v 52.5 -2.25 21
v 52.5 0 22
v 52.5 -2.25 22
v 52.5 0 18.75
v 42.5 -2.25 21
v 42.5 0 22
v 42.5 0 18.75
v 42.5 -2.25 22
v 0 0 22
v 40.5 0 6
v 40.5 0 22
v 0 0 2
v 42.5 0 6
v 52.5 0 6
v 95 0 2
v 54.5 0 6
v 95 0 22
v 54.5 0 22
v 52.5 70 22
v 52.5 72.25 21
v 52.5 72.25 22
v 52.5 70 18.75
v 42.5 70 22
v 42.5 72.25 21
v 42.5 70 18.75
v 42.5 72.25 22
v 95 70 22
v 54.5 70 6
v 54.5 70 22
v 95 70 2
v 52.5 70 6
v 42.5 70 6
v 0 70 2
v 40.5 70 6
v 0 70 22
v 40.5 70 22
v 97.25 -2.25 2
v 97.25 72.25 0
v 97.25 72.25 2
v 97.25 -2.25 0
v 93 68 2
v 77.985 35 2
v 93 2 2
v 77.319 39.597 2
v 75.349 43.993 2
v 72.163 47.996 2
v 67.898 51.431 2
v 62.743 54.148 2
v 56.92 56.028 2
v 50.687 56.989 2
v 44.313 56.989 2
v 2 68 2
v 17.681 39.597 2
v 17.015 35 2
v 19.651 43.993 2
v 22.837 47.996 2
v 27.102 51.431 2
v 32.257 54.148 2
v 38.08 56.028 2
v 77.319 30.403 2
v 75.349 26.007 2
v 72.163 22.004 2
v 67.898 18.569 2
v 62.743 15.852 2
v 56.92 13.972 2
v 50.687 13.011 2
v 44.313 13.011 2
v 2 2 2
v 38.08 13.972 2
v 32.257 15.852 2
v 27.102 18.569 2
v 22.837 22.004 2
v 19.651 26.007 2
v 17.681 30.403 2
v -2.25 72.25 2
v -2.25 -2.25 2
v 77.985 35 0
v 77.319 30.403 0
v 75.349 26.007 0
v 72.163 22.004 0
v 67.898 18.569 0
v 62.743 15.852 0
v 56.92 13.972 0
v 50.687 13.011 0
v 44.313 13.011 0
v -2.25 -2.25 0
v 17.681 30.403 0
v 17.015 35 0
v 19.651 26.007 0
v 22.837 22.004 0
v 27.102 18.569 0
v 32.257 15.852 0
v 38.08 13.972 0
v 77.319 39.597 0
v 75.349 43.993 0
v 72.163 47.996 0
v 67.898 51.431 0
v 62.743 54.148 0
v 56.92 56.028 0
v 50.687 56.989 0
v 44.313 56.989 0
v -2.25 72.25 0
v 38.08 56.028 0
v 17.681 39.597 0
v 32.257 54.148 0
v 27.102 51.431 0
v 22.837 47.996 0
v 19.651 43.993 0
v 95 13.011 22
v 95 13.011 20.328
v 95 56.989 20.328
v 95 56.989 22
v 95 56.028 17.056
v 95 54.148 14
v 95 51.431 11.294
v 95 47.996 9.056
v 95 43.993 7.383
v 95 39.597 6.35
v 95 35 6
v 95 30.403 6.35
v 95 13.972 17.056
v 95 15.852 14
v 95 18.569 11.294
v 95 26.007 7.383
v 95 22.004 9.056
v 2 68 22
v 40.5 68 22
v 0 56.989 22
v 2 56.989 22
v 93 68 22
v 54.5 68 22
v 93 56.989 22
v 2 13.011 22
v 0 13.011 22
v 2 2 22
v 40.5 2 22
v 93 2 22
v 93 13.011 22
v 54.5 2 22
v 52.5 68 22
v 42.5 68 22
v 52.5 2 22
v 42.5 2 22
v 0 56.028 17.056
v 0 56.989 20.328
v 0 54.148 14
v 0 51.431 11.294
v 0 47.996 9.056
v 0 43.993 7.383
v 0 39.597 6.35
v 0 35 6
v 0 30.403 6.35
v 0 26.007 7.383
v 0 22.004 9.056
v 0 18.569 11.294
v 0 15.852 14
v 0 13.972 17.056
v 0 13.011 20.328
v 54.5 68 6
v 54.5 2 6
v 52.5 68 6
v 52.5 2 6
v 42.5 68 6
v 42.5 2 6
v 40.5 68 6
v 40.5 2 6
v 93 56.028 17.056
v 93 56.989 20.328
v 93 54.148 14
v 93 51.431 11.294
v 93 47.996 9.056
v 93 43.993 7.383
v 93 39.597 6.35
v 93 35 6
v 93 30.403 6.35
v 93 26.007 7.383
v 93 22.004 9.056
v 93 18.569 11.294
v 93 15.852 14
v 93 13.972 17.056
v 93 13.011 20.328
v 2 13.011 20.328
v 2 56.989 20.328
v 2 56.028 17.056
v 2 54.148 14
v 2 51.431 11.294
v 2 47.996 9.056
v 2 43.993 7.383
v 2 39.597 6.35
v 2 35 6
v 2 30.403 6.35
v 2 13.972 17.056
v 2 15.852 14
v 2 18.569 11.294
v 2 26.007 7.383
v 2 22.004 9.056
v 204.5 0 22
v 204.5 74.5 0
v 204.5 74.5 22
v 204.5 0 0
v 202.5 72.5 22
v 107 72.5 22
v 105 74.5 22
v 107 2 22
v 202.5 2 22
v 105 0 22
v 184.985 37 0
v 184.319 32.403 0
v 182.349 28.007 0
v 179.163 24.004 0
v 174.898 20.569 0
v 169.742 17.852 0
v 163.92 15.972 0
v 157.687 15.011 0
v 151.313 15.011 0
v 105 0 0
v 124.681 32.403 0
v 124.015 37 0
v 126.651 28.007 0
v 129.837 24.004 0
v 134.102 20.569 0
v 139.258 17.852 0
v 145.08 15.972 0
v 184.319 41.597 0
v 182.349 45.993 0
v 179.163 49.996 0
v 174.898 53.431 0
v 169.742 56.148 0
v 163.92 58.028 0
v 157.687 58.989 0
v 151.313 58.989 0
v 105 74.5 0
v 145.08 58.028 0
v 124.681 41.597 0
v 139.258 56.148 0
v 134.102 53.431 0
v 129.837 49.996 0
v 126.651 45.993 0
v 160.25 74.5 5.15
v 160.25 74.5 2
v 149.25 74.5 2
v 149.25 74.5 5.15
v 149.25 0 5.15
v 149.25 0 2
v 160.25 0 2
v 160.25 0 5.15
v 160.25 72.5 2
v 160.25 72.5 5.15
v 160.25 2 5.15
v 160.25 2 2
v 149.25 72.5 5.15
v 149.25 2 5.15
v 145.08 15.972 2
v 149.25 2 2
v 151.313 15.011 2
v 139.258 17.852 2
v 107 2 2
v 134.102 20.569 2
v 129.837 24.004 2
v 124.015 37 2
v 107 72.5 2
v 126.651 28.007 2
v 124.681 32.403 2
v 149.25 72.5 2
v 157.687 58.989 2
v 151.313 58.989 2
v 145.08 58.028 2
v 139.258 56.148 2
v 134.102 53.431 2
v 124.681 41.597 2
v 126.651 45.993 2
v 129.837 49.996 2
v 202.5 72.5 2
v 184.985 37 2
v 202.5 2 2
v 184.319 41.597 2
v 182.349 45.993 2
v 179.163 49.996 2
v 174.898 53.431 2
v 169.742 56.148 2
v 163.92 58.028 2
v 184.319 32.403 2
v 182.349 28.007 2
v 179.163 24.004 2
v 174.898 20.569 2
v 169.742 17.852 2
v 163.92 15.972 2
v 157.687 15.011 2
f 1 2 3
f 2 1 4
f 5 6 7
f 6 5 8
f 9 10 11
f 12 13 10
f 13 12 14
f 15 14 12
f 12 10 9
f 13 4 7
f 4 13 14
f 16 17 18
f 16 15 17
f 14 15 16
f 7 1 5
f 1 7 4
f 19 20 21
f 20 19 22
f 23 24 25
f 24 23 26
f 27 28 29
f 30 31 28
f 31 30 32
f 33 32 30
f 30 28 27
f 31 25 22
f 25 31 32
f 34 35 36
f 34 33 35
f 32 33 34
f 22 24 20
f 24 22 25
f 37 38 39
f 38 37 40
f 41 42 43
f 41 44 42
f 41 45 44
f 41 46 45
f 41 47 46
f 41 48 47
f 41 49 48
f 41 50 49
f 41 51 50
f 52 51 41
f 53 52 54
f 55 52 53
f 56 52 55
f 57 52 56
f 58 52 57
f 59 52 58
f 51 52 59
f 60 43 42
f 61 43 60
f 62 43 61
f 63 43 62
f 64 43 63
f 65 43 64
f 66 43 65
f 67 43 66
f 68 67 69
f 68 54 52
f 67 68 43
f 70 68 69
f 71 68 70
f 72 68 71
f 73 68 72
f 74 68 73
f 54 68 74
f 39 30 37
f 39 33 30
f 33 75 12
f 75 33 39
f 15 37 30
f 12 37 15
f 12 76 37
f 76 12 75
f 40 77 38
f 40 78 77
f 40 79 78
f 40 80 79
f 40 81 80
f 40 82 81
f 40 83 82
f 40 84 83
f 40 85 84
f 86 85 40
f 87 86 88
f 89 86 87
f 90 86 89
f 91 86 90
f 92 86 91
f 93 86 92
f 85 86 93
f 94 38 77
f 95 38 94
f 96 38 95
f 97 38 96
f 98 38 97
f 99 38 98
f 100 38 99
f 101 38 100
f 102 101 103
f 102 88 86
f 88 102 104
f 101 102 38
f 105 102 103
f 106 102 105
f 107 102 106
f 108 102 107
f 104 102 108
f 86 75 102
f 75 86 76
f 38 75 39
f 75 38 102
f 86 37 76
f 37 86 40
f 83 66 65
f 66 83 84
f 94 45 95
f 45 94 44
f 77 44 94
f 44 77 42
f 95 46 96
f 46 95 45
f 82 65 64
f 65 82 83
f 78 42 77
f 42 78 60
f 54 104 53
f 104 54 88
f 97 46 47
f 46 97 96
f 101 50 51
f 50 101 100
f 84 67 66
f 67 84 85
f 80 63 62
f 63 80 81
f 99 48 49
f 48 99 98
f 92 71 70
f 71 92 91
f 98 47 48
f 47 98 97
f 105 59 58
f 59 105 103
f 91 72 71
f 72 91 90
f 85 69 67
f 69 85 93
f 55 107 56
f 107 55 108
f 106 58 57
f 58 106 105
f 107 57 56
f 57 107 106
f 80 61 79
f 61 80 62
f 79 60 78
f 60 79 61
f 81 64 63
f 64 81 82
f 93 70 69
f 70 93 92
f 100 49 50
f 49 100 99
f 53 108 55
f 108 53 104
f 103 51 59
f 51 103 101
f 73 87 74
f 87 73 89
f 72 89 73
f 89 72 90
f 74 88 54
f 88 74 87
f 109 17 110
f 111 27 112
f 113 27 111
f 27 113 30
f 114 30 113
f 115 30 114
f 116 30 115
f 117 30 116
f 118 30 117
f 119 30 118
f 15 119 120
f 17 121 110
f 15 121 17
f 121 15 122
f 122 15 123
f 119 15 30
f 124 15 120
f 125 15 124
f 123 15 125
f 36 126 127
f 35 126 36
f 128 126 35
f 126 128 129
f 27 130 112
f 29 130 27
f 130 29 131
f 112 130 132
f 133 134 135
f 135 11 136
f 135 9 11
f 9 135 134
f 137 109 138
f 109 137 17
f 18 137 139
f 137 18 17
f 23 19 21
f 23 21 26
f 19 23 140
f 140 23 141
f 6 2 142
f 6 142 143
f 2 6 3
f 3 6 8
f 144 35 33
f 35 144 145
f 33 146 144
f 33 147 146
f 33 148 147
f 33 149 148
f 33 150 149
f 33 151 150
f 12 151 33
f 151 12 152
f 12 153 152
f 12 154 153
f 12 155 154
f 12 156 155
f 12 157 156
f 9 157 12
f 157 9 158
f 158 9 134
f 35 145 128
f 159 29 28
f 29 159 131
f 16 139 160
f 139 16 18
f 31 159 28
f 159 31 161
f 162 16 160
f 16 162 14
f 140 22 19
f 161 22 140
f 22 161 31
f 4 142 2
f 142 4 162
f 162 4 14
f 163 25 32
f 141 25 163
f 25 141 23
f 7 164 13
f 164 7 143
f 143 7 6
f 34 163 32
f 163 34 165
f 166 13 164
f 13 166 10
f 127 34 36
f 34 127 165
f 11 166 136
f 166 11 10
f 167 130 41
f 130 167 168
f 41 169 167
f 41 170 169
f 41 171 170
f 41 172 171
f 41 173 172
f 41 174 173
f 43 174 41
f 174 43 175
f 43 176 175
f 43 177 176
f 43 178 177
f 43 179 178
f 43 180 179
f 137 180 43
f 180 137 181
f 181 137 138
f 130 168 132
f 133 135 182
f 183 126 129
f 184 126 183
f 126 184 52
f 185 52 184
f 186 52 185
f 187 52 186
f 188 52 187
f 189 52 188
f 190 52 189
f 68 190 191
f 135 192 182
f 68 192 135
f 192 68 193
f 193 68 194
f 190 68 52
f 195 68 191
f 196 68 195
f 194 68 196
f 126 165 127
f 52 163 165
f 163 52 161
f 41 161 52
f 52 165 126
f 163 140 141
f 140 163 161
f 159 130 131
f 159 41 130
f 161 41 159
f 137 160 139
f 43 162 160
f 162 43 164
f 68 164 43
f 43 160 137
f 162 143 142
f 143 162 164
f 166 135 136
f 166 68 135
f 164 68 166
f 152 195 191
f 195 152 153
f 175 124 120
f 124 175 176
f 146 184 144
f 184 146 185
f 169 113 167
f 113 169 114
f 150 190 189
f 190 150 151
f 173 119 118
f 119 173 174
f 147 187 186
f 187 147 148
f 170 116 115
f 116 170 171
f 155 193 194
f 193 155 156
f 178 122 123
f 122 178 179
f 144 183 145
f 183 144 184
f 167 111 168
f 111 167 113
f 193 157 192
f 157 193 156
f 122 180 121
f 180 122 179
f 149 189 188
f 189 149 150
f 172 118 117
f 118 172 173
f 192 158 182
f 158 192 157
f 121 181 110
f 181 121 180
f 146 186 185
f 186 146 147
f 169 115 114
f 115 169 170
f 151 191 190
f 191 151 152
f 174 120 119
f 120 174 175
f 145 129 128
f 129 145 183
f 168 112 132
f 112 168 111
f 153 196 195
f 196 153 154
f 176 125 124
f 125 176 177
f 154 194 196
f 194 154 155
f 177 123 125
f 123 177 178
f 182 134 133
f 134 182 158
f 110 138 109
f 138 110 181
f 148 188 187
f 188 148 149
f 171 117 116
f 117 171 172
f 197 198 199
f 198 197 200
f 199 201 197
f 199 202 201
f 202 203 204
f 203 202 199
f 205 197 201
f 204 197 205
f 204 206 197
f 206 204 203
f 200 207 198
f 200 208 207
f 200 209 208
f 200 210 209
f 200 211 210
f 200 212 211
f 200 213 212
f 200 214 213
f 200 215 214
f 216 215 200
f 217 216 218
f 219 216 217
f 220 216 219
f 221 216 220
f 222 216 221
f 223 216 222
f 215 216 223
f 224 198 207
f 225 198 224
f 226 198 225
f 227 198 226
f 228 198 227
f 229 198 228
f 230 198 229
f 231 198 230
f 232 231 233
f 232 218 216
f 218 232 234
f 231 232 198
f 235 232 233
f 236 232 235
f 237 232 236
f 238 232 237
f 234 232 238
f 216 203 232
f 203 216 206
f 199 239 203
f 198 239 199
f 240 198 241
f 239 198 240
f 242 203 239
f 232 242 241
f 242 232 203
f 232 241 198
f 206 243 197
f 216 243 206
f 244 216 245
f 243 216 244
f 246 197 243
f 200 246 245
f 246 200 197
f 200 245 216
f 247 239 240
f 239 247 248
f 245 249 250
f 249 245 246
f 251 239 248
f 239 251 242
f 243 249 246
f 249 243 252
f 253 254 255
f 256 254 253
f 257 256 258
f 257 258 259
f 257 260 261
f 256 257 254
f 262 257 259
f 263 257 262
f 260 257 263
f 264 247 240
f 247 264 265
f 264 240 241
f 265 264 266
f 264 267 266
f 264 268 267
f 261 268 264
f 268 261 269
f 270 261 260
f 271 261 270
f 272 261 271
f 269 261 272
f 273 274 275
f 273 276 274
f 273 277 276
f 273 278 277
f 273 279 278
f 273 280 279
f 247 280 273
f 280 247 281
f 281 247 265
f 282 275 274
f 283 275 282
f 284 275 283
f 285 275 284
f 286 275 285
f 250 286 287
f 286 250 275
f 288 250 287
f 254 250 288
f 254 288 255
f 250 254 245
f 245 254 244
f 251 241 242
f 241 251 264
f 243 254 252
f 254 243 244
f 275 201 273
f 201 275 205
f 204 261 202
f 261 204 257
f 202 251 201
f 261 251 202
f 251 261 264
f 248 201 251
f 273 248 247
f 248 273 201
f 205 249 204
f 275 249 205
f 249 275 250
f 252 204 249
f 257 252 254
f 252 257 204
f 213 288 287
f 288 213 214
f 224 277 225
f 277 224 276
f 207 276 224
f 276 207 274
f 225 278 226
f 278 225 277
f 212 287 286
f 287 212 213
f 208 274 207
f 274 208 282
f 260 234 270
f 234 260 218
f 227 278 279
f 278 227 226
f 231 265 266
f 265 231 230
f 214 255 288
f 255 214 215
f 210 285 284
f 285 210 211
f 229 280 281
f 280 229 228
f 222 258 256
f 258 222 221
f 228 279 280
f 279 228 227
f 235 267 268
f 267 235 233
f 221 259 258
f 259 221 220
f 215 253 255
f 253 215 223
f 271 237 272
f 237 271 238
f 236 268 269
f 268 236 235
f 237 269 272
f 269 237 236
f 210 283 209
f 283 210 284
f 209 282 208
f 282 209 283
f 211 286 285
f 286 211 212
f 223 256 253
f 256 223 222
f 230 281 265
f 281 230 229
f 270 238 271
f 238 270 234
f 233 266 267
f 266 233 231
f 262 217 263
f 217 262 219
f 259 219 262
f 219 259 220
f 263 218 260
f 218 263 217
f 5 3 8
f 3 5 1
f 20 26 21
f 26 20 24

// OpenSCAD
CARD_SIZE_LONG_EDGE =91;
CARD_SIZE_SHORT_EDGE = 66;
CARD_STACK_HEIGHT = 20;
WALL_THICKNESS = 2;
TAB_THICKNESS = 10;
EXTRA_SPACE = .25;
// rounded cutouts remove a "circle" from the bottom surface, and a 1/2 "circle" from each short end of the bottom piece
/* [Cutouts] */
// Percent of card deck height to cutout
END_CUTOUT_HEIGHT_PERCENTAGE = 80; // [0:100]
// Percent of box width to cutout
END_CUTOUT_WIDTH_PERCENTAGE  = 67; // [0:100]
// Percent of box width to cutout
BOTTOM_CUTOUT_WIDTH_PERCENTAGE = 67; // [0:100]
// percent of box length to cutout
BOTTOM_CUTOUT_LENGTH_PERCENTAGE = 67; // [0:100]
// preview[view:south west, tilt:top diagonal]


CARD_LONG_EDGE = CARD_SIZE_LONG_EDGE + (WALL_THICKNESS*2);
CARD_SHORT_EDGE = CARD_SIZE_SHORT_EDGE + (WALL_THICKNESS*2);
ALL_EXTRA_SPACE = (EXTRA_SPACE *2);

LID_OUTSIDE_LONG_THICKNESS = CARD_LONG_EDGE + (WALL_THICKNESS*2);
LID_OUTSIDE_SHORT_THICKNESS = CARD_SHORT_EDGE + (WALL_THICKNESS*2);

SPACE_BETWEEN_BOTTOM_AND_LID = LID_OUTSIDE_LONG_THICKNESS + (WALL_THICKNESS*2)+ 2;

HEIGHT = CARD_STACK_HEIGHT + WALL_THICKNESS;

// rounded cut-outs
// ends
END_CUTOUT_LENGTH = CARD_LONG_EDGE + 2;
END_CUTOUT_RADIUS = CARD_STACK_HEIGHT * END_CUTOUT_HEIGHT_PERCENTAGE/100;
END_CUTOUT_WIDTH  = CARD_SIZE_SHORT_EDGE * END_CUTOUT_WIDTH_PERCENTAGE/100;
// since we'll be scaling our cylinder, we really need the ratio to scale by for the longer dimension, not the direct dimension itself
END_CUTOUT_WIDTH_RATIO = END_CUTOUT_WIDTH / (END_CUTOUT_RADIUS*2);
// bottom
BOTTOM_CUTOUT_LENGTH = (WALL_THICKNESS * 2)+ 2;
BOTTOM_CUTOUT_RADIUS = CARD_SIZE_SHORT_EDGE * BOTTOM_CUTOUT_WIDTH_PERCENTAGE / 2 /100;
BOTTOM_CUTOUT_HEIGHT = CARD_SIZE_LONG_EDGE * BOTTOM_CUTOUT_LENGTH_PERCENTAGE/100;
// since we'll be scaling our cylinder, we really need the ratio to scale by for the longer dimension, not the direct dimension itself
BOTTOM_CUTOUT_HEIGHT_RATIO = BOTTOM_CUTOUT_HEIGHT / (BOTTOM_CUTOUT_RADIUS*2);


	//*Start Bottom of Box

					//*Start wedge 1
translate ([((CARD_LONG_EDGE/2) -(TAB_THICKNESS/2)),-WALL_THICKNESS-EXTRA_SPACE,HEIGHT-WALL_THICKNESS-1-EXTRA_SPACE]) 

difference (){
cube ([TAB_THICKNESS,WALL_THICKNESS+EXTRA_SPACE,WALL_THICKNESS+EXTRA_SPACE]);
translate ([0, WALL_THICKNESS+(EXTRA_SPACE),0]) rotate ([135,0,0])  

cube ([(TAB_THICKNESS+3), sqrt(((WALL_THICKNESS+EXTRA_SPACE)*(WALL_THICKNESS+EXTRA_SPACE))+((WALL_THICKNESS+EXTRA_SPACE)*(WALL_THICKNESS+EXTRA_SPACE))), sqrt(((WALL_THICKNESS+EXTRA_SPACE)*(WALL_THICKNESS+EXTRA_SPACE))+((WALL_THICKNESS+EXTRA_SPACE)*(WALL_THICKNESS+EXTRA_SPACE)))]);

}
			//*end wedge 1


			//*Start wedge 2
translate ([((CARD_LONG_EDGE/2) - (TAB_THICKNESS/2)),CARD_SHORT_EDGE,HEIGHT-WALL_THICKNESS-1-EXTRA_SPACE])

 difference (){
cube ([TAB_THICKNESS,WALL_THICKNESS+EXTRA_SPACE,WALL_THICKNESS+EXTRA_SPACE]);

translate ([0 ,0 ,0]) rotate ([-45,0,0])  cube ([(TAB_THICKNESS+3),sqrt(((WALL_THICKNESS+EXTRA_SPACE)*(WALL_THICKNESS+EXTRA_SPACE))+((WALL_THICKNESS+EXTRA_SPACE)*(WALL_THICKNESS+EXTRA_SPACE))),sqrt(((WALL_THICKNESS+EXTRA_SPACE)*(WALL_THICKNESS+EXTRA_SPACE))+((WALL_THICKNESS+EXTRA_SPACE)*(WALL_THICKNESS+EXTRA_SPACE)))]);
}
			//*end wedge 2


translate ([((CARD_LONG_EDGE/2) -(TAB_THICKNESS/2)),-WALL_THICKNESS-EXTRA_SPACE,HEIGHT-1])  cube ([TAB_THICKNESS, WALL_THICKNESS+EXTRA_SPACE, 1]); 					//*Tab

translate ([((CARD_LONG_EDGE/2) -(TAB_THICKNESS/2)),CARD_SHORT_EDGE,HEIGHT-1])  cube ([TAB_THICKNESS, WALL_THICKNESS+EXTRA_SPACE, 1]);				//*Tab

difference()
{
	translate ([-WALL_THICKNESS-EXTRA_SPACE, -WALL_THICKNESS-EXTRA_SPACE, 0 ]) cube ([CARD_LONG_EDGE + (WALL_THICKNESS*2)+ALL_EXTRA_SPACE, CARD_SHORT_EDGE + (WALL_THICKNESS*2)+ALL_EXTRA_SPACE, WALL_THICKNESS]);  						//*Bottom Plate

	translate([CARD_LONG_EDGE/2,CARD_SHORT_EDGE/2,-WALL_THICKNESS]) scale([BOTTOM_CUTOUT_HEIGHT_RATIO,1,1]) cylinder(h=BOTTOM_CUTOUT_LENGTH,r=BOTTOM_CUTOUT_RADIUS);  //*Bottom cutout to cut through bottom plate
}

difference() 
{
	cube ([CARD_LONG_EDGE,CARD_SHORT_EDGE,HEIGHT]);		//*Main Body

	translate([ ((CARD_LONG_EDGE / 2) + (TAB_THICKNESS/2)), -.5, ((HEIGHT+ WALL_THICKNESS) / 4) ]) cube ([2, CARD_SHORT_EDGE + 2, HEIGHT]);	//*Tab cutout
	
	translate([ ((CARD_LONG_EDGE / 2) - ((TAB_THICKNESS/2)+2)), -.5, ((HEIGHT+ WALL_THICKNESS)/ 4) ]) cube ([2, CARD_SHORT_EDGE + 2, HEIGHT ]);  //*Tab cutout

	translate([WALL_THICKNESS,WALL_THICKNESS,WALL_THICKNESS]) cube ([CARD_LONG_EDGE - (WALL_THICKNESS*2),CARD_SHORT_EDGE - (WALL_THICKNESS*2),HEIGHT]);			//*Hole

    translate([-WALL_THICKNESS/2,CARD_SHORT_EDGE/2,HEIGHT]) scale([1,END_CUTOUT_WIDTH_RATIO,1]) rotate([0,90,0]) cylinder(h=END_CUTOUT_LENGTH,r=END_CUTOUT_RADIUS);  //*End cutout
	translate([CARD_LONG_EDGE/2,CARD_SHORT_EDGE/2,-WALL_THICKNESS]) scale([BOTTOM_CUTOUT_HEIGHT_RATIO,1,1]) cylinder(h=BOTTOM_CUTOUT_LENGTH,r=BOTTOM_CUTOUT_RADIUS);  //*Bottom cutout to cut through main box
}
			//*End Bottom of Box



			//*Start Top of Box


translate ([SPACE_BETWEEN_BOTTOM_AND_LID, 0, 0]) 


difference() 
{
	cube ([LID_OUTSIDE_LONG_THICKNESS+ALL_EXTRA_SPACE, LID_OUTSIDE_SHORT_THICKNESS+ALL_EXTRA_SPACE, HEIGHT]); 		//*Top Main Body


	translate([ ((LID_OUTSIDE_LONG_THICKNESS+ALL_EXTRA_SPACE) / 2)-((TAB_THICKNESS+1)/2), -.5, WALL_THICKNESS]) 
cube ([(TAB_THICKNESS+1), LID_OUTSIDE_SHORT_THICKNESS + 2, WALL_THICKNESS+1.15 ]); 	//*Tab Hole

	translate([WALL_THICKNESS,WALL_THICKNESS, WALL_THICKNESS]) 
cube ([LID_OUTSIDE_LONG_THICKNESS - (WALL_THICKNESS*2)+ALL_EXTRA_SPACE,LID_OUTSIDE_SHORT_THICKNESS - (WALL_THICKNESS*2)+ALL_EXTRA_SPACE,HEIGHT]);		//*Hole
translate([LID_OUTSIDE_LONG_THICKNESS/2,LID_OUTSIDE_SHORT_THICKNESS/2,-WALL_THICKNESS]) scale([BOTTOM_CUTOUT_HEIGHT_RATIO,1,1]) cylinder(h=BOTTOM_CUTOUT_LENGTH,r=BOTTOM_CUTOUT_RADIUS);  //*Bottom cutout to cut through main box
}

			//* End Top of Box
